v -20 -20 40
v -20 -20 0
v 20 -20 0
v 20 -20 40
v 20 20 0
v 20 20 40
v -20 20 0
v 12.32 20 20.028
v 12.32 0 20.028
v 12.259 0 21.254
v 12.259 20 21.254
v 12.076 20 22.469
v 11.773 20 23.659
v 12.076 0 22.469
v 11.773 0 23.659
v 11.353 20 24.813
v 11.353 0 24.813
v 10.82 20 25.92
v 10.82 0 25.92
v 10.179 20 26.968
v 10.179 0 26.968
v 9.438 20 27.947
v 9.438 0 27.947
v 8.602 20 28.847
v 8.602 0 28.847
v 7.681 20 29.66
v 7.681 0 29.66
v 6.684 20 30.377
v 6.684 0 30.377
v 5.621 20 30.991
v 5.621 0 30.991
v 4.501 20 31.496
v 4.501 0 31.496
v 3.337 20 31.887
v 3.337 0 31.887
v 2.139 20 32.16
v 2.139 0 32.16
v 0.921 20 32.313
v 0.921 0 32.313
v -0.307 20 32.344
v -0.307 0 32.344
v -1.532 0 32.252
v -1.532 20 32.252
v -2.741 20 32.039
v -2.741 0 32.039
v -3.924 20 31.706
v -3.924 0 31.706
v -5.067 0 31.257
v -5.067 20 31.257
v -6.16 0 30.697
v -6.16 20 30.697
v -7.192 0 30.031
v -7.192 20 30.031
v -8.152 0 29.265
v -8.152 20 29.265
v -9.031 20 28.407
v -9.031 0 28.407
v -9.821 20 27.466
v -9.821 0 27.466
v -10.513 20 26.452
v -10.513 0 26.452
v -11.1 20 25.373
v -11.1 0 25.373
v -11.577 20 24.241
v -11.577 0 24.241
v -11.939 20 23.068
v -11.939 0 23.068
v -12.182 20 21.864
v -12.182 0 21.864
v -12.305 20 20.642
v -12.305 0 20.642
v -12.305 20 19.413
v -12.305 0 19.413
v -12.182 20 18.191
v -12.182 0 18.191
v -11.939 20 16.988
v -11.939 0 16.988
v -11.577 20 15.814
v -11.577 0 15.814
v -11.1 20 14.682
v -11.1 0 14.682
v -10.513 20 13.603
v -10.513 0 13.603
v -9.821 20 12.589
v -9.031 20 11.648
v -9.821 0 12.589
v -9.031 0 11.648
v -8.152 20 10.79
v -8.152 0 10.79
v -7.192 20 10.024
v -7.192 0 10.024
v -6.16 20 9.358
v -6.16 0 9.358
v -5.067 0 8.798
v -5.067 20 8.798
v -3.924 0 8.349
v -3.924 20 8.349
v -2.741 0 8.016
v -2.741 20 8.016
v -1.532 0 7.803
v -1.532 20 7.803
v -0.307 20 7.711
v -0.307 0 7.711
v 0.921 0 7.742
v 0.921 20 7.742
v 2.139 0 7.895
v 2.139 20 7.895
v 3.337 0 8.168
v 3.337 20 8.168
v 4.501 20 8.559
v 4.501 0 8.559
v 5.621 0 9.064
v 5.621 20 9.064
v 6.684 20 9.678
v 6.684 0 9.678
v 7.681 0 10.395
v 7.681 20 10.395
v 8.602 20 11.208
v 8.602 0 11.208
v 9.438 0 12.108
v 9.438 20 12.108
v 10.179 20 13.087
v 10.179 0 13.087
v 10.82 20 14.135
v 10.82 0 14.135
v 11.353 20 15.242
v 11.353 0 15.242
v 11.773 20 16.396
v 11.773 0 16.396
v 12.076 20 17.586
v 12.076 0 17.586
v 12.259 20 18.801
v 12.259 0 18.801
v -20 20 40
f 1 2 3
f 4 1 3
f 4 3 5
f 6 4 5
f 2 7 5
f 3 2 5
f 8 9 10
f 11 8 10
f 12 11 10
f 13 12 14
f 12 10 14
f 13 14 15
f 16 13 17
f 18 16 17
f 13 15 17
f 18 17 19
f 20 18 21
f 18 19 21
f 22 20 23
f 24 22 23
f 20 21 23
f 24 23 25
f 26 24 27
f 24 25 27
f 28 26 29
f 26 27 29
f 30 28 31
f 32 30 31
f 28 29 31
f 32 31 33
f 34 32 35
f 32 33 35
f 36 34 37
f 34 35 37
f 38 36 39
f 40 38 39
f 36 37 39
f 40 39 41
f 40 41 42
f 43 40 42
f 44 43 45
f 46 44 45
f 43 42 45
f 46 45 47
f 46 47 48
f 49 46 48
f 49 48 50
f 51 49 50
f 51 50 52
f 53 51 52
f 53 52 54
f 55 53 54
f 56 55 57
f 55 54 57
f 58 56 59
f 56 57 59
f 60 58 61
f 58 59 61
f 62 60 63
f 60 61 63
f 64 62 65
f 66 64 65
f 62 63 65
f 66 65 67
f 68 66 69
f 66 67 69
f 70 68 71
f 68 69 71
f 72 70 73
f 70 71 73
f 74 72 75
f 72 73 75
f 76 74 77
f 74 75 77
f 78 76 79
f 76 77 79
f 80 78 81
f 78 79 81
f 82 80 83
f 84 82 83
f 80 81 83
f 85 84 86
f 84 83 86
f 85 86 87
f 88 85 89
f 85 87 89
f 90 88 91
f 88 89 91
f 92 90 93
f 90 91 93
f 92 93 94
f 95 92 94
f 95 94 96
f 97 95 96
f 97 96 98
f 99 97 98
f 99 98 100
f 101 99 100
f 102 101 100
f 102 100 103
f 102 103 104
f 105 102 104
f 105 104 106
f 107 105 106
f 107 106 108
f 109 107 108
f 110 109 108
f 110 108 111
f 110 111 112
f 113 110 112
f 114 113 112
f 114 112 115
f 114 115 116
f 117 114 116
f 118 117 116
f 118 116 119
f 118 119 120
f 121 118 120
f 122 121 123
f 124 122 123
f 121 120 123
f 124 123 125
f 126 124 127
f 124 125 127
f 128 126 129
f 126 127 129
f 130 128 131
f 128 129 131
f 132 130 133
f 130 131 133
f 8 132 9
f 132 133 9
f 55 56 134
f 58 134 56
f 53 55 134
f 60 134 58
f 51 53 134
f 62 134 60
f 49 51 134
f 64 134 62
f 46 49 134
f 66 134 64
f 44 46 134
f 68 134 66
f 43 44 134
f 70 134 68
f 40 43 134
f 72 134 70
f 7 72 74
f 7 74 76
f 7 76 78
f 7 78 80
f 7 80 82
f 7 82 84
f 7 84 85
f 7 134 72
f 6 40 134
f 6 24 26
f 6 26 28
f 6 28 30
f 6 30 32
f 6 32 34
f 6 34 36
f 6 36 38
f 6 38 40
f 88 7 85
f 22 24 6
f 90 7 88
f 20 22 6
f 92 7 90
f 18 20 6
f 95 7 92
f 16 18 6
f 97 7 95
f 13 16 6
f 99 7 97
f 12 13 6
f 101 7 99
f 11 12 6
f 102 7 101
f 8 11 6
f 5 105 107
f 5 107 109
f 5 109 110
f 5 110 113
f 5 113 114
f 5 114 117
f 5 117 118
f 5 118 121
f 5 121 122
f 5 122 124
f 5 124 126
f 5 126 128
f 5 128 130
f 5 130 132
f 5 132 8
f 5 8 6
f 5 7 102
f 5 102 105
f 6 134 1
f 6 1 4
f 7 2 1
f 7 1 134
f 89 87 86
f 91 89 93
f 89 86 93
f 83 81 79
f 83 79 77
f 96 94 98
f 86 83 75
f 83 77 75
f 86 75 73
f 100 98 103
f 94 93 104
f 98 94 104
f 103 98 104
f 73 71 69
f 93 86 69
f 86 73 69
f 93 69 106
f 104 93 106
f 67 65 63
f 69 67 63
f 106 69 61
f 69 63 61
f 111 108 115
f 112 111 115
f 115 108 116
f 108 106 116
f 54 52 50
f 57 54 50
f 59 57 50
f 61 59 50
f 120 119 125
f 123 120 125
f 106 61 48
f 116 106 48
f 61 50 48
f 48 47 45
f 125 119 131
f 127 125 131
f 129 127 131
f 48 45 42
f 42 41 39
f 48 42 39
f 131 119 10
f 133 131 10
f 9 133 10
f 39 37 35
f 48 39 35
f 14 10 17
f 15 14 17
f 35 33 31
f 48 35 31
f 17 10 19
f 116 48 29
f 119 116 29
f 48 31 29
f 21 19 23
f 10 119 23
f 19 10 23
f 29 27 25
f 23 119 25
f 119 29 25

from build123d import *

# Parameters (mm, degrees)
F0_W     = 40
F0_H     = 40
F1_DEPTH = 40
F2_R     = 12.32
F3_DEPTH = 20


with BuildPart() as f1:
    # F0 (on Top) → F1 (new body)
    with BuildSketch(Plane.XY):
        Rectangle(F0_W, F0_H)
    extrude(amount=F1_DEPTH)

    # F2 (on Front) → F3 (cut)
    with BuildSketch(Plane.XZ):
        with Locations((0, 20.027552)):
            Circle(F2_R)
    extrude(amount=-F3_DEPTH, mode=Mode.SUBTRACT)


solid = f1.part
